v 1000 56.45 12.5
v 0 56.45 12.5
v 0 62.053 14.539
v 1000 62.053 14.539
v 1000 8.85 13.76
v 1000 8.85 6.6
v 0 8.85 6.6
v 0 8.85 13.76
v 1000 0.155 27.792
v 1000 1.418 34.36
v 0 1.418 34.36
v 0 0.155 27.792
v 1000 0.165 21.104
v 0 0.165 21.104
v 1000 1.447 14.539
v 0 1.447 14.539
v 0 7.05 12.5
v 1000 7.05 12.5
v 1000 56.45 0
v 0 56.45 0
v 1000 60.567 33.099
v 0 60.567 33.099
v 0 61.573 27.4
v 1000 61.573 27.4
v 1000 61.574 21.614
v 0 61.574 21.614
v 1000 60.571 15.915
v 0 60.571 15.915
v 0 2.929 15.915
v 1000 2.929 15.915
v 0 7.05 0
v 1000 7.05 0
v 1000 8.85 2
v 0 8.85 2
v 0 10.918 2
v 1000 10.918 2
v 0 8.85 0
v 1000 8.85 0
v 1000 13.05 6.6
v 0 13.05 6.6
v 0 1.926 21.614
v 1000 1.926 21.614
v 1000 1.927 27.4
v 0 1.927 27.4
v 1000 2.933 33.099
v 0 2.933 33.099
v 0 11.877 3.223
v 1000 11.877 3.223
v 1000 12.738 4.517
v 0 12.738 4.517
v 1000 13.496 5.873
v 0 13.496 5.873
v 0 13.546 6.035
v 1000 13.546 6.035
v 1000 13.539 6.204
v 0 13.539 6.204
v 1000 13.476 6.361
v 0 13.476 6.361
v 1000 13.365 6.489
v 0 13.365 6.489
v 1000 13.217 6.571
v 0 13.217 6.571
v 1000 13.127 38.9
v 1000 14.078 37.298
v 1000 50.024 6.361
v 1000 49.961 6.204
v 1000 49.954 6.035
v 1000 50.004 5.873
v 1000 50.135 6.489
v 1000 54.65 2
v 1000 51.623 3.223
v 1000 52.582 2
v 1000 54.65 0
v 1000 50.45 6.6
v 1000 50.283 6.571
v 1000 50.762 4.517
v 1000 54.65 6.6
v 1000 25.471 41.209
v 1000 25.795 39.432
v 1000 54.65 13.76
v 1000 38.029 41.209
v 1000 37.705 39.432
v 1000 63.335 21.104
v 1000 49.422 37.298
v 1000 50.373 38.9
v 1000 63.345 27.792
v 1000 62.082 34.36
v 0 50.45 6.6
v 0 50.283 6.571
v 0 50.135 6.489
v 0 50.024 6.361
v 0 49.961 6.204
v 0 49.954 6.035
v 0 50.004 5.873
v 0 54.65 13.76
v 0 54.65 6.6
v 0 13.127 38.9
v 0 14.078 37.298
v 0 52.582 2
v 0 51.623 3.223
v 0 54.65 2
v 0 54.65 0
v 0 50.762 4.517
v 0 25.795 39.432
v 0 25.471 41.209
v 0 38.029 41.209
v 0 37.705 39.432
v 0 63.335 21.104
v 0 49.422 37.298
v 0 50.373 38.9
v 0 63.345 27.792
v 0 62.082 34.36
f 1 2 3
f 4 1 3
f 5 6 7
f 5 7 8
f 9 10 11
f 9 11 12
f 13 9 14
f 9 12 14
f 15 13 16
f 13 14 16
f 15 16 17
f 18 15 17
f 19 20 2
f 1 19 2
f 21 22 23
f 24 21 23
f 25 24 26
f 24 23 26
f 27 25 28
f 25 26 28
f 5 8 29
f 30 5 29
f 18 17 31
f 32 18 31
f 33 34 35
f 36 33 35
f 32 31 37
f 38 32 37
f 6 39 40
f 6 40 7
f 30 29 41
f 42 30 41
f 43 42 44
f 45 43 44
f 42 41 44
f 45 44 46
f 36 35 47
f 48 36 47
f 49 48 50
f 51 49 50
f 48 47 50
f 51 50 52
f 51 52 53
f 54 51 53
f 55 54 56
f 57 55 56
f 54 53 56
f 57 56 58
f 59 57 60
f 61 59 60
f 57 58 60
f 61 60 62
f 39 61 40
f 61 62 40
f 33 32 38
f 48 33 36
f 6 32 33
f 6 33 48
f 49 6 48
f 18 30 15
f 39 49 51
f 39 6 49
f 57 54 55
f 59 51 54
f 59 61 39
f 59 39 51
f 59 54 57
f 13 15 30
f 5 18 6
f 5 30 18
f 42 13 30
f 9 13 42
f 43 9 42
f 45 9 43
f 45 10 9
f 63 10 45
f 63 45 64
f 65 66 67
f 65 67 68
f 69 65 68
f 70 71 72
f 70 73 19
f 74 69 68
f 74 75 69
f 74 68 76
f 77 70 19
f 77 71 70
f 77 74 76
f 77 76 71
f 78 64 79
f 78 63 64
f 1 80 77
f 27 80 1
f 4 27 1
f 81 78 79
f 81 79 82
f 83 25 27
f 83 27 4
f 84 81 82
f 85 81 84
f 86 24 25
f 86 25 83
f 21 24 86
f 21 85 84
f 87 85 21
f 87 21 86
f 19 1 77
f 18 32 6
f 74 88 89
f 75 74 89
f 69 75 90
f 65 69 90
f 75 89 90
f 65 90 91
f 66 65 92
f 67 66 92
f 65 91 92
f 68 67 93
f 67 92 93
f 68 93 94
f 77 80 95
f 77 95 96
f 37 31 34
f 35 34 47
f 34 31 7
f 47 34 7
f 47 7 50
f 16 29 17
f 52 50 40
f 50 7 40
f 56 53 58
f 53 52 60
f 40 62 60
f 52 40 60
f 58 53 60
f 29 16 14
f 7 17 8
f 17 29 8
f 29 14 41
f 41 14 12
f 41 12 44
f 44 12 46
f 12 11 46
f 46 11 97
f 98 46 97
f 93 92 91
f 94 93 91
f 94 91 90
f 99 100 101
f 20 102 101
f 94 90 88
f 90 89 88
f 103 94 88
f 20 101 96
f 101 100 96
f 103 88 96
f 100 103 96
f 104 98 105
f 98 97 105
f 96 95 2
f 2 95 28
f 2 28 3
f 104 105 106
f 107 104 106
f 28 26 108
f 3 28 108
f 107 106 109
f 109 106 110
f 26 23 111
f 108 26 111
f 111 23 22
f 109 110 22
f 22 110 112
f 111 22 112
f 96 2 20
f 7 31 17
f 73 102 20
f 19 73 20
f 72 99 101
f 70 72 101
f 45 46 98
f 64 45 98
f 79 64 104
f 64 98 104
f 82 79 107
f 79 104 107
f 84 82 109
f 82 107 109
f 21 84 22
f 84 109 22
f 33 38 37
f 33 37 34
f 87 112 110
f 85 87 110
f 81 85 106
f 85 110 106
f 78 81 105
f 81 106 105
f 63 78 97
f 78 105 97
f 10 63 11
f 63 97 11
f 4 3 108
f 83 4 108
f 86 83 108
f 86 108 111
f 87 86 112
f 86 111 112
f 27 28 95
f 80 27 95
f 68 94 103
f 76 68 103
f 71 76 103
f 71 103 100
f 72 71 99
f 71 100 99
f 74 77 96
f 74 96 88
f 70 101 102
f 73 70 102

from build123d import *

# Parameters (mm, degrees)
F1_DEPTH = 1000


with BuildPart() as f1:
    # F0 (on Right) → F1 (new body)
    with BuildSketch(Plane.YZ):
        with BuildLine():
            Line((56.45, 0), (56.45, 12.5))
            Line((56.45, 12.5), (62.052685, 14.539211))
            ThreePointArc((62.052685, 14.539211), (63.499961, 24.447472), (62.082432, 34.360032))
            ThreePointArc((62.082432, 34.360032), (31.75, 41.5), (1.417568, 34.360032))
            ThreePointArc((1.417568, 34.360032), (3.9e-05, 24.447472), (1.447315, 14.539211))
            Line((1.447315, 14.539211), (7.05, 12.5))
            Line((7.05, 12.5), (7.05, 0))
            Line((7.05, 0), (8.85, 0))
            Line((8.85, 0), (8.85, 2))
            Line((8.85, 2), (10.91777, 2))
            ThreePointArc((10.91777, 2), (12.319719, 3.861416), (13.495637, 5.873267))
            ThreePointArc((13.495637, 5.873267), (13.476243, 6.361375), (13.05, 6.6))
            Line((13.05, 6.6), (8.85, 6.6))
            Line((8.85, 6.6), (8.85, 13.760374))
            Line((8.85, 13.760374), (2.929064, 15.915418))
            ThreePointArc((2.929064, 15.915418), (1.800001, 24.507341), (2.932863, 33.098764))
            ThreePointArc((2.932863, 33.098764), (31.75, 39.7), (60.567137, 33.098764))
            ThreePointArc((60.567137, 33.098764), (61.699999, 24.507341), (60.570936, 15.915418))
            Line((60.570936, 15.915418), (54.65, 13.760374))
            Line((54.65, 13.760374), (54.65, 6.6))
            Line((54.65, 6.6), (50.45, 6.6))
            ThreePointArc((50.45, 6.6), (50.023757, 6.361375), (50.004363, 5.873267))
            ThreePointArc((50.004363, 5.873267), (51.180281, 3.861416), (52.58223, 2))
            Line((52.58223, 2), (54.65, 2))
            Line((54.65, 2), (54.65, 0))
            Line((54.65, 0), (56.45, 0))
        make_face()
    extrude(amount=F1_DEPTH)


solid = f1.part
